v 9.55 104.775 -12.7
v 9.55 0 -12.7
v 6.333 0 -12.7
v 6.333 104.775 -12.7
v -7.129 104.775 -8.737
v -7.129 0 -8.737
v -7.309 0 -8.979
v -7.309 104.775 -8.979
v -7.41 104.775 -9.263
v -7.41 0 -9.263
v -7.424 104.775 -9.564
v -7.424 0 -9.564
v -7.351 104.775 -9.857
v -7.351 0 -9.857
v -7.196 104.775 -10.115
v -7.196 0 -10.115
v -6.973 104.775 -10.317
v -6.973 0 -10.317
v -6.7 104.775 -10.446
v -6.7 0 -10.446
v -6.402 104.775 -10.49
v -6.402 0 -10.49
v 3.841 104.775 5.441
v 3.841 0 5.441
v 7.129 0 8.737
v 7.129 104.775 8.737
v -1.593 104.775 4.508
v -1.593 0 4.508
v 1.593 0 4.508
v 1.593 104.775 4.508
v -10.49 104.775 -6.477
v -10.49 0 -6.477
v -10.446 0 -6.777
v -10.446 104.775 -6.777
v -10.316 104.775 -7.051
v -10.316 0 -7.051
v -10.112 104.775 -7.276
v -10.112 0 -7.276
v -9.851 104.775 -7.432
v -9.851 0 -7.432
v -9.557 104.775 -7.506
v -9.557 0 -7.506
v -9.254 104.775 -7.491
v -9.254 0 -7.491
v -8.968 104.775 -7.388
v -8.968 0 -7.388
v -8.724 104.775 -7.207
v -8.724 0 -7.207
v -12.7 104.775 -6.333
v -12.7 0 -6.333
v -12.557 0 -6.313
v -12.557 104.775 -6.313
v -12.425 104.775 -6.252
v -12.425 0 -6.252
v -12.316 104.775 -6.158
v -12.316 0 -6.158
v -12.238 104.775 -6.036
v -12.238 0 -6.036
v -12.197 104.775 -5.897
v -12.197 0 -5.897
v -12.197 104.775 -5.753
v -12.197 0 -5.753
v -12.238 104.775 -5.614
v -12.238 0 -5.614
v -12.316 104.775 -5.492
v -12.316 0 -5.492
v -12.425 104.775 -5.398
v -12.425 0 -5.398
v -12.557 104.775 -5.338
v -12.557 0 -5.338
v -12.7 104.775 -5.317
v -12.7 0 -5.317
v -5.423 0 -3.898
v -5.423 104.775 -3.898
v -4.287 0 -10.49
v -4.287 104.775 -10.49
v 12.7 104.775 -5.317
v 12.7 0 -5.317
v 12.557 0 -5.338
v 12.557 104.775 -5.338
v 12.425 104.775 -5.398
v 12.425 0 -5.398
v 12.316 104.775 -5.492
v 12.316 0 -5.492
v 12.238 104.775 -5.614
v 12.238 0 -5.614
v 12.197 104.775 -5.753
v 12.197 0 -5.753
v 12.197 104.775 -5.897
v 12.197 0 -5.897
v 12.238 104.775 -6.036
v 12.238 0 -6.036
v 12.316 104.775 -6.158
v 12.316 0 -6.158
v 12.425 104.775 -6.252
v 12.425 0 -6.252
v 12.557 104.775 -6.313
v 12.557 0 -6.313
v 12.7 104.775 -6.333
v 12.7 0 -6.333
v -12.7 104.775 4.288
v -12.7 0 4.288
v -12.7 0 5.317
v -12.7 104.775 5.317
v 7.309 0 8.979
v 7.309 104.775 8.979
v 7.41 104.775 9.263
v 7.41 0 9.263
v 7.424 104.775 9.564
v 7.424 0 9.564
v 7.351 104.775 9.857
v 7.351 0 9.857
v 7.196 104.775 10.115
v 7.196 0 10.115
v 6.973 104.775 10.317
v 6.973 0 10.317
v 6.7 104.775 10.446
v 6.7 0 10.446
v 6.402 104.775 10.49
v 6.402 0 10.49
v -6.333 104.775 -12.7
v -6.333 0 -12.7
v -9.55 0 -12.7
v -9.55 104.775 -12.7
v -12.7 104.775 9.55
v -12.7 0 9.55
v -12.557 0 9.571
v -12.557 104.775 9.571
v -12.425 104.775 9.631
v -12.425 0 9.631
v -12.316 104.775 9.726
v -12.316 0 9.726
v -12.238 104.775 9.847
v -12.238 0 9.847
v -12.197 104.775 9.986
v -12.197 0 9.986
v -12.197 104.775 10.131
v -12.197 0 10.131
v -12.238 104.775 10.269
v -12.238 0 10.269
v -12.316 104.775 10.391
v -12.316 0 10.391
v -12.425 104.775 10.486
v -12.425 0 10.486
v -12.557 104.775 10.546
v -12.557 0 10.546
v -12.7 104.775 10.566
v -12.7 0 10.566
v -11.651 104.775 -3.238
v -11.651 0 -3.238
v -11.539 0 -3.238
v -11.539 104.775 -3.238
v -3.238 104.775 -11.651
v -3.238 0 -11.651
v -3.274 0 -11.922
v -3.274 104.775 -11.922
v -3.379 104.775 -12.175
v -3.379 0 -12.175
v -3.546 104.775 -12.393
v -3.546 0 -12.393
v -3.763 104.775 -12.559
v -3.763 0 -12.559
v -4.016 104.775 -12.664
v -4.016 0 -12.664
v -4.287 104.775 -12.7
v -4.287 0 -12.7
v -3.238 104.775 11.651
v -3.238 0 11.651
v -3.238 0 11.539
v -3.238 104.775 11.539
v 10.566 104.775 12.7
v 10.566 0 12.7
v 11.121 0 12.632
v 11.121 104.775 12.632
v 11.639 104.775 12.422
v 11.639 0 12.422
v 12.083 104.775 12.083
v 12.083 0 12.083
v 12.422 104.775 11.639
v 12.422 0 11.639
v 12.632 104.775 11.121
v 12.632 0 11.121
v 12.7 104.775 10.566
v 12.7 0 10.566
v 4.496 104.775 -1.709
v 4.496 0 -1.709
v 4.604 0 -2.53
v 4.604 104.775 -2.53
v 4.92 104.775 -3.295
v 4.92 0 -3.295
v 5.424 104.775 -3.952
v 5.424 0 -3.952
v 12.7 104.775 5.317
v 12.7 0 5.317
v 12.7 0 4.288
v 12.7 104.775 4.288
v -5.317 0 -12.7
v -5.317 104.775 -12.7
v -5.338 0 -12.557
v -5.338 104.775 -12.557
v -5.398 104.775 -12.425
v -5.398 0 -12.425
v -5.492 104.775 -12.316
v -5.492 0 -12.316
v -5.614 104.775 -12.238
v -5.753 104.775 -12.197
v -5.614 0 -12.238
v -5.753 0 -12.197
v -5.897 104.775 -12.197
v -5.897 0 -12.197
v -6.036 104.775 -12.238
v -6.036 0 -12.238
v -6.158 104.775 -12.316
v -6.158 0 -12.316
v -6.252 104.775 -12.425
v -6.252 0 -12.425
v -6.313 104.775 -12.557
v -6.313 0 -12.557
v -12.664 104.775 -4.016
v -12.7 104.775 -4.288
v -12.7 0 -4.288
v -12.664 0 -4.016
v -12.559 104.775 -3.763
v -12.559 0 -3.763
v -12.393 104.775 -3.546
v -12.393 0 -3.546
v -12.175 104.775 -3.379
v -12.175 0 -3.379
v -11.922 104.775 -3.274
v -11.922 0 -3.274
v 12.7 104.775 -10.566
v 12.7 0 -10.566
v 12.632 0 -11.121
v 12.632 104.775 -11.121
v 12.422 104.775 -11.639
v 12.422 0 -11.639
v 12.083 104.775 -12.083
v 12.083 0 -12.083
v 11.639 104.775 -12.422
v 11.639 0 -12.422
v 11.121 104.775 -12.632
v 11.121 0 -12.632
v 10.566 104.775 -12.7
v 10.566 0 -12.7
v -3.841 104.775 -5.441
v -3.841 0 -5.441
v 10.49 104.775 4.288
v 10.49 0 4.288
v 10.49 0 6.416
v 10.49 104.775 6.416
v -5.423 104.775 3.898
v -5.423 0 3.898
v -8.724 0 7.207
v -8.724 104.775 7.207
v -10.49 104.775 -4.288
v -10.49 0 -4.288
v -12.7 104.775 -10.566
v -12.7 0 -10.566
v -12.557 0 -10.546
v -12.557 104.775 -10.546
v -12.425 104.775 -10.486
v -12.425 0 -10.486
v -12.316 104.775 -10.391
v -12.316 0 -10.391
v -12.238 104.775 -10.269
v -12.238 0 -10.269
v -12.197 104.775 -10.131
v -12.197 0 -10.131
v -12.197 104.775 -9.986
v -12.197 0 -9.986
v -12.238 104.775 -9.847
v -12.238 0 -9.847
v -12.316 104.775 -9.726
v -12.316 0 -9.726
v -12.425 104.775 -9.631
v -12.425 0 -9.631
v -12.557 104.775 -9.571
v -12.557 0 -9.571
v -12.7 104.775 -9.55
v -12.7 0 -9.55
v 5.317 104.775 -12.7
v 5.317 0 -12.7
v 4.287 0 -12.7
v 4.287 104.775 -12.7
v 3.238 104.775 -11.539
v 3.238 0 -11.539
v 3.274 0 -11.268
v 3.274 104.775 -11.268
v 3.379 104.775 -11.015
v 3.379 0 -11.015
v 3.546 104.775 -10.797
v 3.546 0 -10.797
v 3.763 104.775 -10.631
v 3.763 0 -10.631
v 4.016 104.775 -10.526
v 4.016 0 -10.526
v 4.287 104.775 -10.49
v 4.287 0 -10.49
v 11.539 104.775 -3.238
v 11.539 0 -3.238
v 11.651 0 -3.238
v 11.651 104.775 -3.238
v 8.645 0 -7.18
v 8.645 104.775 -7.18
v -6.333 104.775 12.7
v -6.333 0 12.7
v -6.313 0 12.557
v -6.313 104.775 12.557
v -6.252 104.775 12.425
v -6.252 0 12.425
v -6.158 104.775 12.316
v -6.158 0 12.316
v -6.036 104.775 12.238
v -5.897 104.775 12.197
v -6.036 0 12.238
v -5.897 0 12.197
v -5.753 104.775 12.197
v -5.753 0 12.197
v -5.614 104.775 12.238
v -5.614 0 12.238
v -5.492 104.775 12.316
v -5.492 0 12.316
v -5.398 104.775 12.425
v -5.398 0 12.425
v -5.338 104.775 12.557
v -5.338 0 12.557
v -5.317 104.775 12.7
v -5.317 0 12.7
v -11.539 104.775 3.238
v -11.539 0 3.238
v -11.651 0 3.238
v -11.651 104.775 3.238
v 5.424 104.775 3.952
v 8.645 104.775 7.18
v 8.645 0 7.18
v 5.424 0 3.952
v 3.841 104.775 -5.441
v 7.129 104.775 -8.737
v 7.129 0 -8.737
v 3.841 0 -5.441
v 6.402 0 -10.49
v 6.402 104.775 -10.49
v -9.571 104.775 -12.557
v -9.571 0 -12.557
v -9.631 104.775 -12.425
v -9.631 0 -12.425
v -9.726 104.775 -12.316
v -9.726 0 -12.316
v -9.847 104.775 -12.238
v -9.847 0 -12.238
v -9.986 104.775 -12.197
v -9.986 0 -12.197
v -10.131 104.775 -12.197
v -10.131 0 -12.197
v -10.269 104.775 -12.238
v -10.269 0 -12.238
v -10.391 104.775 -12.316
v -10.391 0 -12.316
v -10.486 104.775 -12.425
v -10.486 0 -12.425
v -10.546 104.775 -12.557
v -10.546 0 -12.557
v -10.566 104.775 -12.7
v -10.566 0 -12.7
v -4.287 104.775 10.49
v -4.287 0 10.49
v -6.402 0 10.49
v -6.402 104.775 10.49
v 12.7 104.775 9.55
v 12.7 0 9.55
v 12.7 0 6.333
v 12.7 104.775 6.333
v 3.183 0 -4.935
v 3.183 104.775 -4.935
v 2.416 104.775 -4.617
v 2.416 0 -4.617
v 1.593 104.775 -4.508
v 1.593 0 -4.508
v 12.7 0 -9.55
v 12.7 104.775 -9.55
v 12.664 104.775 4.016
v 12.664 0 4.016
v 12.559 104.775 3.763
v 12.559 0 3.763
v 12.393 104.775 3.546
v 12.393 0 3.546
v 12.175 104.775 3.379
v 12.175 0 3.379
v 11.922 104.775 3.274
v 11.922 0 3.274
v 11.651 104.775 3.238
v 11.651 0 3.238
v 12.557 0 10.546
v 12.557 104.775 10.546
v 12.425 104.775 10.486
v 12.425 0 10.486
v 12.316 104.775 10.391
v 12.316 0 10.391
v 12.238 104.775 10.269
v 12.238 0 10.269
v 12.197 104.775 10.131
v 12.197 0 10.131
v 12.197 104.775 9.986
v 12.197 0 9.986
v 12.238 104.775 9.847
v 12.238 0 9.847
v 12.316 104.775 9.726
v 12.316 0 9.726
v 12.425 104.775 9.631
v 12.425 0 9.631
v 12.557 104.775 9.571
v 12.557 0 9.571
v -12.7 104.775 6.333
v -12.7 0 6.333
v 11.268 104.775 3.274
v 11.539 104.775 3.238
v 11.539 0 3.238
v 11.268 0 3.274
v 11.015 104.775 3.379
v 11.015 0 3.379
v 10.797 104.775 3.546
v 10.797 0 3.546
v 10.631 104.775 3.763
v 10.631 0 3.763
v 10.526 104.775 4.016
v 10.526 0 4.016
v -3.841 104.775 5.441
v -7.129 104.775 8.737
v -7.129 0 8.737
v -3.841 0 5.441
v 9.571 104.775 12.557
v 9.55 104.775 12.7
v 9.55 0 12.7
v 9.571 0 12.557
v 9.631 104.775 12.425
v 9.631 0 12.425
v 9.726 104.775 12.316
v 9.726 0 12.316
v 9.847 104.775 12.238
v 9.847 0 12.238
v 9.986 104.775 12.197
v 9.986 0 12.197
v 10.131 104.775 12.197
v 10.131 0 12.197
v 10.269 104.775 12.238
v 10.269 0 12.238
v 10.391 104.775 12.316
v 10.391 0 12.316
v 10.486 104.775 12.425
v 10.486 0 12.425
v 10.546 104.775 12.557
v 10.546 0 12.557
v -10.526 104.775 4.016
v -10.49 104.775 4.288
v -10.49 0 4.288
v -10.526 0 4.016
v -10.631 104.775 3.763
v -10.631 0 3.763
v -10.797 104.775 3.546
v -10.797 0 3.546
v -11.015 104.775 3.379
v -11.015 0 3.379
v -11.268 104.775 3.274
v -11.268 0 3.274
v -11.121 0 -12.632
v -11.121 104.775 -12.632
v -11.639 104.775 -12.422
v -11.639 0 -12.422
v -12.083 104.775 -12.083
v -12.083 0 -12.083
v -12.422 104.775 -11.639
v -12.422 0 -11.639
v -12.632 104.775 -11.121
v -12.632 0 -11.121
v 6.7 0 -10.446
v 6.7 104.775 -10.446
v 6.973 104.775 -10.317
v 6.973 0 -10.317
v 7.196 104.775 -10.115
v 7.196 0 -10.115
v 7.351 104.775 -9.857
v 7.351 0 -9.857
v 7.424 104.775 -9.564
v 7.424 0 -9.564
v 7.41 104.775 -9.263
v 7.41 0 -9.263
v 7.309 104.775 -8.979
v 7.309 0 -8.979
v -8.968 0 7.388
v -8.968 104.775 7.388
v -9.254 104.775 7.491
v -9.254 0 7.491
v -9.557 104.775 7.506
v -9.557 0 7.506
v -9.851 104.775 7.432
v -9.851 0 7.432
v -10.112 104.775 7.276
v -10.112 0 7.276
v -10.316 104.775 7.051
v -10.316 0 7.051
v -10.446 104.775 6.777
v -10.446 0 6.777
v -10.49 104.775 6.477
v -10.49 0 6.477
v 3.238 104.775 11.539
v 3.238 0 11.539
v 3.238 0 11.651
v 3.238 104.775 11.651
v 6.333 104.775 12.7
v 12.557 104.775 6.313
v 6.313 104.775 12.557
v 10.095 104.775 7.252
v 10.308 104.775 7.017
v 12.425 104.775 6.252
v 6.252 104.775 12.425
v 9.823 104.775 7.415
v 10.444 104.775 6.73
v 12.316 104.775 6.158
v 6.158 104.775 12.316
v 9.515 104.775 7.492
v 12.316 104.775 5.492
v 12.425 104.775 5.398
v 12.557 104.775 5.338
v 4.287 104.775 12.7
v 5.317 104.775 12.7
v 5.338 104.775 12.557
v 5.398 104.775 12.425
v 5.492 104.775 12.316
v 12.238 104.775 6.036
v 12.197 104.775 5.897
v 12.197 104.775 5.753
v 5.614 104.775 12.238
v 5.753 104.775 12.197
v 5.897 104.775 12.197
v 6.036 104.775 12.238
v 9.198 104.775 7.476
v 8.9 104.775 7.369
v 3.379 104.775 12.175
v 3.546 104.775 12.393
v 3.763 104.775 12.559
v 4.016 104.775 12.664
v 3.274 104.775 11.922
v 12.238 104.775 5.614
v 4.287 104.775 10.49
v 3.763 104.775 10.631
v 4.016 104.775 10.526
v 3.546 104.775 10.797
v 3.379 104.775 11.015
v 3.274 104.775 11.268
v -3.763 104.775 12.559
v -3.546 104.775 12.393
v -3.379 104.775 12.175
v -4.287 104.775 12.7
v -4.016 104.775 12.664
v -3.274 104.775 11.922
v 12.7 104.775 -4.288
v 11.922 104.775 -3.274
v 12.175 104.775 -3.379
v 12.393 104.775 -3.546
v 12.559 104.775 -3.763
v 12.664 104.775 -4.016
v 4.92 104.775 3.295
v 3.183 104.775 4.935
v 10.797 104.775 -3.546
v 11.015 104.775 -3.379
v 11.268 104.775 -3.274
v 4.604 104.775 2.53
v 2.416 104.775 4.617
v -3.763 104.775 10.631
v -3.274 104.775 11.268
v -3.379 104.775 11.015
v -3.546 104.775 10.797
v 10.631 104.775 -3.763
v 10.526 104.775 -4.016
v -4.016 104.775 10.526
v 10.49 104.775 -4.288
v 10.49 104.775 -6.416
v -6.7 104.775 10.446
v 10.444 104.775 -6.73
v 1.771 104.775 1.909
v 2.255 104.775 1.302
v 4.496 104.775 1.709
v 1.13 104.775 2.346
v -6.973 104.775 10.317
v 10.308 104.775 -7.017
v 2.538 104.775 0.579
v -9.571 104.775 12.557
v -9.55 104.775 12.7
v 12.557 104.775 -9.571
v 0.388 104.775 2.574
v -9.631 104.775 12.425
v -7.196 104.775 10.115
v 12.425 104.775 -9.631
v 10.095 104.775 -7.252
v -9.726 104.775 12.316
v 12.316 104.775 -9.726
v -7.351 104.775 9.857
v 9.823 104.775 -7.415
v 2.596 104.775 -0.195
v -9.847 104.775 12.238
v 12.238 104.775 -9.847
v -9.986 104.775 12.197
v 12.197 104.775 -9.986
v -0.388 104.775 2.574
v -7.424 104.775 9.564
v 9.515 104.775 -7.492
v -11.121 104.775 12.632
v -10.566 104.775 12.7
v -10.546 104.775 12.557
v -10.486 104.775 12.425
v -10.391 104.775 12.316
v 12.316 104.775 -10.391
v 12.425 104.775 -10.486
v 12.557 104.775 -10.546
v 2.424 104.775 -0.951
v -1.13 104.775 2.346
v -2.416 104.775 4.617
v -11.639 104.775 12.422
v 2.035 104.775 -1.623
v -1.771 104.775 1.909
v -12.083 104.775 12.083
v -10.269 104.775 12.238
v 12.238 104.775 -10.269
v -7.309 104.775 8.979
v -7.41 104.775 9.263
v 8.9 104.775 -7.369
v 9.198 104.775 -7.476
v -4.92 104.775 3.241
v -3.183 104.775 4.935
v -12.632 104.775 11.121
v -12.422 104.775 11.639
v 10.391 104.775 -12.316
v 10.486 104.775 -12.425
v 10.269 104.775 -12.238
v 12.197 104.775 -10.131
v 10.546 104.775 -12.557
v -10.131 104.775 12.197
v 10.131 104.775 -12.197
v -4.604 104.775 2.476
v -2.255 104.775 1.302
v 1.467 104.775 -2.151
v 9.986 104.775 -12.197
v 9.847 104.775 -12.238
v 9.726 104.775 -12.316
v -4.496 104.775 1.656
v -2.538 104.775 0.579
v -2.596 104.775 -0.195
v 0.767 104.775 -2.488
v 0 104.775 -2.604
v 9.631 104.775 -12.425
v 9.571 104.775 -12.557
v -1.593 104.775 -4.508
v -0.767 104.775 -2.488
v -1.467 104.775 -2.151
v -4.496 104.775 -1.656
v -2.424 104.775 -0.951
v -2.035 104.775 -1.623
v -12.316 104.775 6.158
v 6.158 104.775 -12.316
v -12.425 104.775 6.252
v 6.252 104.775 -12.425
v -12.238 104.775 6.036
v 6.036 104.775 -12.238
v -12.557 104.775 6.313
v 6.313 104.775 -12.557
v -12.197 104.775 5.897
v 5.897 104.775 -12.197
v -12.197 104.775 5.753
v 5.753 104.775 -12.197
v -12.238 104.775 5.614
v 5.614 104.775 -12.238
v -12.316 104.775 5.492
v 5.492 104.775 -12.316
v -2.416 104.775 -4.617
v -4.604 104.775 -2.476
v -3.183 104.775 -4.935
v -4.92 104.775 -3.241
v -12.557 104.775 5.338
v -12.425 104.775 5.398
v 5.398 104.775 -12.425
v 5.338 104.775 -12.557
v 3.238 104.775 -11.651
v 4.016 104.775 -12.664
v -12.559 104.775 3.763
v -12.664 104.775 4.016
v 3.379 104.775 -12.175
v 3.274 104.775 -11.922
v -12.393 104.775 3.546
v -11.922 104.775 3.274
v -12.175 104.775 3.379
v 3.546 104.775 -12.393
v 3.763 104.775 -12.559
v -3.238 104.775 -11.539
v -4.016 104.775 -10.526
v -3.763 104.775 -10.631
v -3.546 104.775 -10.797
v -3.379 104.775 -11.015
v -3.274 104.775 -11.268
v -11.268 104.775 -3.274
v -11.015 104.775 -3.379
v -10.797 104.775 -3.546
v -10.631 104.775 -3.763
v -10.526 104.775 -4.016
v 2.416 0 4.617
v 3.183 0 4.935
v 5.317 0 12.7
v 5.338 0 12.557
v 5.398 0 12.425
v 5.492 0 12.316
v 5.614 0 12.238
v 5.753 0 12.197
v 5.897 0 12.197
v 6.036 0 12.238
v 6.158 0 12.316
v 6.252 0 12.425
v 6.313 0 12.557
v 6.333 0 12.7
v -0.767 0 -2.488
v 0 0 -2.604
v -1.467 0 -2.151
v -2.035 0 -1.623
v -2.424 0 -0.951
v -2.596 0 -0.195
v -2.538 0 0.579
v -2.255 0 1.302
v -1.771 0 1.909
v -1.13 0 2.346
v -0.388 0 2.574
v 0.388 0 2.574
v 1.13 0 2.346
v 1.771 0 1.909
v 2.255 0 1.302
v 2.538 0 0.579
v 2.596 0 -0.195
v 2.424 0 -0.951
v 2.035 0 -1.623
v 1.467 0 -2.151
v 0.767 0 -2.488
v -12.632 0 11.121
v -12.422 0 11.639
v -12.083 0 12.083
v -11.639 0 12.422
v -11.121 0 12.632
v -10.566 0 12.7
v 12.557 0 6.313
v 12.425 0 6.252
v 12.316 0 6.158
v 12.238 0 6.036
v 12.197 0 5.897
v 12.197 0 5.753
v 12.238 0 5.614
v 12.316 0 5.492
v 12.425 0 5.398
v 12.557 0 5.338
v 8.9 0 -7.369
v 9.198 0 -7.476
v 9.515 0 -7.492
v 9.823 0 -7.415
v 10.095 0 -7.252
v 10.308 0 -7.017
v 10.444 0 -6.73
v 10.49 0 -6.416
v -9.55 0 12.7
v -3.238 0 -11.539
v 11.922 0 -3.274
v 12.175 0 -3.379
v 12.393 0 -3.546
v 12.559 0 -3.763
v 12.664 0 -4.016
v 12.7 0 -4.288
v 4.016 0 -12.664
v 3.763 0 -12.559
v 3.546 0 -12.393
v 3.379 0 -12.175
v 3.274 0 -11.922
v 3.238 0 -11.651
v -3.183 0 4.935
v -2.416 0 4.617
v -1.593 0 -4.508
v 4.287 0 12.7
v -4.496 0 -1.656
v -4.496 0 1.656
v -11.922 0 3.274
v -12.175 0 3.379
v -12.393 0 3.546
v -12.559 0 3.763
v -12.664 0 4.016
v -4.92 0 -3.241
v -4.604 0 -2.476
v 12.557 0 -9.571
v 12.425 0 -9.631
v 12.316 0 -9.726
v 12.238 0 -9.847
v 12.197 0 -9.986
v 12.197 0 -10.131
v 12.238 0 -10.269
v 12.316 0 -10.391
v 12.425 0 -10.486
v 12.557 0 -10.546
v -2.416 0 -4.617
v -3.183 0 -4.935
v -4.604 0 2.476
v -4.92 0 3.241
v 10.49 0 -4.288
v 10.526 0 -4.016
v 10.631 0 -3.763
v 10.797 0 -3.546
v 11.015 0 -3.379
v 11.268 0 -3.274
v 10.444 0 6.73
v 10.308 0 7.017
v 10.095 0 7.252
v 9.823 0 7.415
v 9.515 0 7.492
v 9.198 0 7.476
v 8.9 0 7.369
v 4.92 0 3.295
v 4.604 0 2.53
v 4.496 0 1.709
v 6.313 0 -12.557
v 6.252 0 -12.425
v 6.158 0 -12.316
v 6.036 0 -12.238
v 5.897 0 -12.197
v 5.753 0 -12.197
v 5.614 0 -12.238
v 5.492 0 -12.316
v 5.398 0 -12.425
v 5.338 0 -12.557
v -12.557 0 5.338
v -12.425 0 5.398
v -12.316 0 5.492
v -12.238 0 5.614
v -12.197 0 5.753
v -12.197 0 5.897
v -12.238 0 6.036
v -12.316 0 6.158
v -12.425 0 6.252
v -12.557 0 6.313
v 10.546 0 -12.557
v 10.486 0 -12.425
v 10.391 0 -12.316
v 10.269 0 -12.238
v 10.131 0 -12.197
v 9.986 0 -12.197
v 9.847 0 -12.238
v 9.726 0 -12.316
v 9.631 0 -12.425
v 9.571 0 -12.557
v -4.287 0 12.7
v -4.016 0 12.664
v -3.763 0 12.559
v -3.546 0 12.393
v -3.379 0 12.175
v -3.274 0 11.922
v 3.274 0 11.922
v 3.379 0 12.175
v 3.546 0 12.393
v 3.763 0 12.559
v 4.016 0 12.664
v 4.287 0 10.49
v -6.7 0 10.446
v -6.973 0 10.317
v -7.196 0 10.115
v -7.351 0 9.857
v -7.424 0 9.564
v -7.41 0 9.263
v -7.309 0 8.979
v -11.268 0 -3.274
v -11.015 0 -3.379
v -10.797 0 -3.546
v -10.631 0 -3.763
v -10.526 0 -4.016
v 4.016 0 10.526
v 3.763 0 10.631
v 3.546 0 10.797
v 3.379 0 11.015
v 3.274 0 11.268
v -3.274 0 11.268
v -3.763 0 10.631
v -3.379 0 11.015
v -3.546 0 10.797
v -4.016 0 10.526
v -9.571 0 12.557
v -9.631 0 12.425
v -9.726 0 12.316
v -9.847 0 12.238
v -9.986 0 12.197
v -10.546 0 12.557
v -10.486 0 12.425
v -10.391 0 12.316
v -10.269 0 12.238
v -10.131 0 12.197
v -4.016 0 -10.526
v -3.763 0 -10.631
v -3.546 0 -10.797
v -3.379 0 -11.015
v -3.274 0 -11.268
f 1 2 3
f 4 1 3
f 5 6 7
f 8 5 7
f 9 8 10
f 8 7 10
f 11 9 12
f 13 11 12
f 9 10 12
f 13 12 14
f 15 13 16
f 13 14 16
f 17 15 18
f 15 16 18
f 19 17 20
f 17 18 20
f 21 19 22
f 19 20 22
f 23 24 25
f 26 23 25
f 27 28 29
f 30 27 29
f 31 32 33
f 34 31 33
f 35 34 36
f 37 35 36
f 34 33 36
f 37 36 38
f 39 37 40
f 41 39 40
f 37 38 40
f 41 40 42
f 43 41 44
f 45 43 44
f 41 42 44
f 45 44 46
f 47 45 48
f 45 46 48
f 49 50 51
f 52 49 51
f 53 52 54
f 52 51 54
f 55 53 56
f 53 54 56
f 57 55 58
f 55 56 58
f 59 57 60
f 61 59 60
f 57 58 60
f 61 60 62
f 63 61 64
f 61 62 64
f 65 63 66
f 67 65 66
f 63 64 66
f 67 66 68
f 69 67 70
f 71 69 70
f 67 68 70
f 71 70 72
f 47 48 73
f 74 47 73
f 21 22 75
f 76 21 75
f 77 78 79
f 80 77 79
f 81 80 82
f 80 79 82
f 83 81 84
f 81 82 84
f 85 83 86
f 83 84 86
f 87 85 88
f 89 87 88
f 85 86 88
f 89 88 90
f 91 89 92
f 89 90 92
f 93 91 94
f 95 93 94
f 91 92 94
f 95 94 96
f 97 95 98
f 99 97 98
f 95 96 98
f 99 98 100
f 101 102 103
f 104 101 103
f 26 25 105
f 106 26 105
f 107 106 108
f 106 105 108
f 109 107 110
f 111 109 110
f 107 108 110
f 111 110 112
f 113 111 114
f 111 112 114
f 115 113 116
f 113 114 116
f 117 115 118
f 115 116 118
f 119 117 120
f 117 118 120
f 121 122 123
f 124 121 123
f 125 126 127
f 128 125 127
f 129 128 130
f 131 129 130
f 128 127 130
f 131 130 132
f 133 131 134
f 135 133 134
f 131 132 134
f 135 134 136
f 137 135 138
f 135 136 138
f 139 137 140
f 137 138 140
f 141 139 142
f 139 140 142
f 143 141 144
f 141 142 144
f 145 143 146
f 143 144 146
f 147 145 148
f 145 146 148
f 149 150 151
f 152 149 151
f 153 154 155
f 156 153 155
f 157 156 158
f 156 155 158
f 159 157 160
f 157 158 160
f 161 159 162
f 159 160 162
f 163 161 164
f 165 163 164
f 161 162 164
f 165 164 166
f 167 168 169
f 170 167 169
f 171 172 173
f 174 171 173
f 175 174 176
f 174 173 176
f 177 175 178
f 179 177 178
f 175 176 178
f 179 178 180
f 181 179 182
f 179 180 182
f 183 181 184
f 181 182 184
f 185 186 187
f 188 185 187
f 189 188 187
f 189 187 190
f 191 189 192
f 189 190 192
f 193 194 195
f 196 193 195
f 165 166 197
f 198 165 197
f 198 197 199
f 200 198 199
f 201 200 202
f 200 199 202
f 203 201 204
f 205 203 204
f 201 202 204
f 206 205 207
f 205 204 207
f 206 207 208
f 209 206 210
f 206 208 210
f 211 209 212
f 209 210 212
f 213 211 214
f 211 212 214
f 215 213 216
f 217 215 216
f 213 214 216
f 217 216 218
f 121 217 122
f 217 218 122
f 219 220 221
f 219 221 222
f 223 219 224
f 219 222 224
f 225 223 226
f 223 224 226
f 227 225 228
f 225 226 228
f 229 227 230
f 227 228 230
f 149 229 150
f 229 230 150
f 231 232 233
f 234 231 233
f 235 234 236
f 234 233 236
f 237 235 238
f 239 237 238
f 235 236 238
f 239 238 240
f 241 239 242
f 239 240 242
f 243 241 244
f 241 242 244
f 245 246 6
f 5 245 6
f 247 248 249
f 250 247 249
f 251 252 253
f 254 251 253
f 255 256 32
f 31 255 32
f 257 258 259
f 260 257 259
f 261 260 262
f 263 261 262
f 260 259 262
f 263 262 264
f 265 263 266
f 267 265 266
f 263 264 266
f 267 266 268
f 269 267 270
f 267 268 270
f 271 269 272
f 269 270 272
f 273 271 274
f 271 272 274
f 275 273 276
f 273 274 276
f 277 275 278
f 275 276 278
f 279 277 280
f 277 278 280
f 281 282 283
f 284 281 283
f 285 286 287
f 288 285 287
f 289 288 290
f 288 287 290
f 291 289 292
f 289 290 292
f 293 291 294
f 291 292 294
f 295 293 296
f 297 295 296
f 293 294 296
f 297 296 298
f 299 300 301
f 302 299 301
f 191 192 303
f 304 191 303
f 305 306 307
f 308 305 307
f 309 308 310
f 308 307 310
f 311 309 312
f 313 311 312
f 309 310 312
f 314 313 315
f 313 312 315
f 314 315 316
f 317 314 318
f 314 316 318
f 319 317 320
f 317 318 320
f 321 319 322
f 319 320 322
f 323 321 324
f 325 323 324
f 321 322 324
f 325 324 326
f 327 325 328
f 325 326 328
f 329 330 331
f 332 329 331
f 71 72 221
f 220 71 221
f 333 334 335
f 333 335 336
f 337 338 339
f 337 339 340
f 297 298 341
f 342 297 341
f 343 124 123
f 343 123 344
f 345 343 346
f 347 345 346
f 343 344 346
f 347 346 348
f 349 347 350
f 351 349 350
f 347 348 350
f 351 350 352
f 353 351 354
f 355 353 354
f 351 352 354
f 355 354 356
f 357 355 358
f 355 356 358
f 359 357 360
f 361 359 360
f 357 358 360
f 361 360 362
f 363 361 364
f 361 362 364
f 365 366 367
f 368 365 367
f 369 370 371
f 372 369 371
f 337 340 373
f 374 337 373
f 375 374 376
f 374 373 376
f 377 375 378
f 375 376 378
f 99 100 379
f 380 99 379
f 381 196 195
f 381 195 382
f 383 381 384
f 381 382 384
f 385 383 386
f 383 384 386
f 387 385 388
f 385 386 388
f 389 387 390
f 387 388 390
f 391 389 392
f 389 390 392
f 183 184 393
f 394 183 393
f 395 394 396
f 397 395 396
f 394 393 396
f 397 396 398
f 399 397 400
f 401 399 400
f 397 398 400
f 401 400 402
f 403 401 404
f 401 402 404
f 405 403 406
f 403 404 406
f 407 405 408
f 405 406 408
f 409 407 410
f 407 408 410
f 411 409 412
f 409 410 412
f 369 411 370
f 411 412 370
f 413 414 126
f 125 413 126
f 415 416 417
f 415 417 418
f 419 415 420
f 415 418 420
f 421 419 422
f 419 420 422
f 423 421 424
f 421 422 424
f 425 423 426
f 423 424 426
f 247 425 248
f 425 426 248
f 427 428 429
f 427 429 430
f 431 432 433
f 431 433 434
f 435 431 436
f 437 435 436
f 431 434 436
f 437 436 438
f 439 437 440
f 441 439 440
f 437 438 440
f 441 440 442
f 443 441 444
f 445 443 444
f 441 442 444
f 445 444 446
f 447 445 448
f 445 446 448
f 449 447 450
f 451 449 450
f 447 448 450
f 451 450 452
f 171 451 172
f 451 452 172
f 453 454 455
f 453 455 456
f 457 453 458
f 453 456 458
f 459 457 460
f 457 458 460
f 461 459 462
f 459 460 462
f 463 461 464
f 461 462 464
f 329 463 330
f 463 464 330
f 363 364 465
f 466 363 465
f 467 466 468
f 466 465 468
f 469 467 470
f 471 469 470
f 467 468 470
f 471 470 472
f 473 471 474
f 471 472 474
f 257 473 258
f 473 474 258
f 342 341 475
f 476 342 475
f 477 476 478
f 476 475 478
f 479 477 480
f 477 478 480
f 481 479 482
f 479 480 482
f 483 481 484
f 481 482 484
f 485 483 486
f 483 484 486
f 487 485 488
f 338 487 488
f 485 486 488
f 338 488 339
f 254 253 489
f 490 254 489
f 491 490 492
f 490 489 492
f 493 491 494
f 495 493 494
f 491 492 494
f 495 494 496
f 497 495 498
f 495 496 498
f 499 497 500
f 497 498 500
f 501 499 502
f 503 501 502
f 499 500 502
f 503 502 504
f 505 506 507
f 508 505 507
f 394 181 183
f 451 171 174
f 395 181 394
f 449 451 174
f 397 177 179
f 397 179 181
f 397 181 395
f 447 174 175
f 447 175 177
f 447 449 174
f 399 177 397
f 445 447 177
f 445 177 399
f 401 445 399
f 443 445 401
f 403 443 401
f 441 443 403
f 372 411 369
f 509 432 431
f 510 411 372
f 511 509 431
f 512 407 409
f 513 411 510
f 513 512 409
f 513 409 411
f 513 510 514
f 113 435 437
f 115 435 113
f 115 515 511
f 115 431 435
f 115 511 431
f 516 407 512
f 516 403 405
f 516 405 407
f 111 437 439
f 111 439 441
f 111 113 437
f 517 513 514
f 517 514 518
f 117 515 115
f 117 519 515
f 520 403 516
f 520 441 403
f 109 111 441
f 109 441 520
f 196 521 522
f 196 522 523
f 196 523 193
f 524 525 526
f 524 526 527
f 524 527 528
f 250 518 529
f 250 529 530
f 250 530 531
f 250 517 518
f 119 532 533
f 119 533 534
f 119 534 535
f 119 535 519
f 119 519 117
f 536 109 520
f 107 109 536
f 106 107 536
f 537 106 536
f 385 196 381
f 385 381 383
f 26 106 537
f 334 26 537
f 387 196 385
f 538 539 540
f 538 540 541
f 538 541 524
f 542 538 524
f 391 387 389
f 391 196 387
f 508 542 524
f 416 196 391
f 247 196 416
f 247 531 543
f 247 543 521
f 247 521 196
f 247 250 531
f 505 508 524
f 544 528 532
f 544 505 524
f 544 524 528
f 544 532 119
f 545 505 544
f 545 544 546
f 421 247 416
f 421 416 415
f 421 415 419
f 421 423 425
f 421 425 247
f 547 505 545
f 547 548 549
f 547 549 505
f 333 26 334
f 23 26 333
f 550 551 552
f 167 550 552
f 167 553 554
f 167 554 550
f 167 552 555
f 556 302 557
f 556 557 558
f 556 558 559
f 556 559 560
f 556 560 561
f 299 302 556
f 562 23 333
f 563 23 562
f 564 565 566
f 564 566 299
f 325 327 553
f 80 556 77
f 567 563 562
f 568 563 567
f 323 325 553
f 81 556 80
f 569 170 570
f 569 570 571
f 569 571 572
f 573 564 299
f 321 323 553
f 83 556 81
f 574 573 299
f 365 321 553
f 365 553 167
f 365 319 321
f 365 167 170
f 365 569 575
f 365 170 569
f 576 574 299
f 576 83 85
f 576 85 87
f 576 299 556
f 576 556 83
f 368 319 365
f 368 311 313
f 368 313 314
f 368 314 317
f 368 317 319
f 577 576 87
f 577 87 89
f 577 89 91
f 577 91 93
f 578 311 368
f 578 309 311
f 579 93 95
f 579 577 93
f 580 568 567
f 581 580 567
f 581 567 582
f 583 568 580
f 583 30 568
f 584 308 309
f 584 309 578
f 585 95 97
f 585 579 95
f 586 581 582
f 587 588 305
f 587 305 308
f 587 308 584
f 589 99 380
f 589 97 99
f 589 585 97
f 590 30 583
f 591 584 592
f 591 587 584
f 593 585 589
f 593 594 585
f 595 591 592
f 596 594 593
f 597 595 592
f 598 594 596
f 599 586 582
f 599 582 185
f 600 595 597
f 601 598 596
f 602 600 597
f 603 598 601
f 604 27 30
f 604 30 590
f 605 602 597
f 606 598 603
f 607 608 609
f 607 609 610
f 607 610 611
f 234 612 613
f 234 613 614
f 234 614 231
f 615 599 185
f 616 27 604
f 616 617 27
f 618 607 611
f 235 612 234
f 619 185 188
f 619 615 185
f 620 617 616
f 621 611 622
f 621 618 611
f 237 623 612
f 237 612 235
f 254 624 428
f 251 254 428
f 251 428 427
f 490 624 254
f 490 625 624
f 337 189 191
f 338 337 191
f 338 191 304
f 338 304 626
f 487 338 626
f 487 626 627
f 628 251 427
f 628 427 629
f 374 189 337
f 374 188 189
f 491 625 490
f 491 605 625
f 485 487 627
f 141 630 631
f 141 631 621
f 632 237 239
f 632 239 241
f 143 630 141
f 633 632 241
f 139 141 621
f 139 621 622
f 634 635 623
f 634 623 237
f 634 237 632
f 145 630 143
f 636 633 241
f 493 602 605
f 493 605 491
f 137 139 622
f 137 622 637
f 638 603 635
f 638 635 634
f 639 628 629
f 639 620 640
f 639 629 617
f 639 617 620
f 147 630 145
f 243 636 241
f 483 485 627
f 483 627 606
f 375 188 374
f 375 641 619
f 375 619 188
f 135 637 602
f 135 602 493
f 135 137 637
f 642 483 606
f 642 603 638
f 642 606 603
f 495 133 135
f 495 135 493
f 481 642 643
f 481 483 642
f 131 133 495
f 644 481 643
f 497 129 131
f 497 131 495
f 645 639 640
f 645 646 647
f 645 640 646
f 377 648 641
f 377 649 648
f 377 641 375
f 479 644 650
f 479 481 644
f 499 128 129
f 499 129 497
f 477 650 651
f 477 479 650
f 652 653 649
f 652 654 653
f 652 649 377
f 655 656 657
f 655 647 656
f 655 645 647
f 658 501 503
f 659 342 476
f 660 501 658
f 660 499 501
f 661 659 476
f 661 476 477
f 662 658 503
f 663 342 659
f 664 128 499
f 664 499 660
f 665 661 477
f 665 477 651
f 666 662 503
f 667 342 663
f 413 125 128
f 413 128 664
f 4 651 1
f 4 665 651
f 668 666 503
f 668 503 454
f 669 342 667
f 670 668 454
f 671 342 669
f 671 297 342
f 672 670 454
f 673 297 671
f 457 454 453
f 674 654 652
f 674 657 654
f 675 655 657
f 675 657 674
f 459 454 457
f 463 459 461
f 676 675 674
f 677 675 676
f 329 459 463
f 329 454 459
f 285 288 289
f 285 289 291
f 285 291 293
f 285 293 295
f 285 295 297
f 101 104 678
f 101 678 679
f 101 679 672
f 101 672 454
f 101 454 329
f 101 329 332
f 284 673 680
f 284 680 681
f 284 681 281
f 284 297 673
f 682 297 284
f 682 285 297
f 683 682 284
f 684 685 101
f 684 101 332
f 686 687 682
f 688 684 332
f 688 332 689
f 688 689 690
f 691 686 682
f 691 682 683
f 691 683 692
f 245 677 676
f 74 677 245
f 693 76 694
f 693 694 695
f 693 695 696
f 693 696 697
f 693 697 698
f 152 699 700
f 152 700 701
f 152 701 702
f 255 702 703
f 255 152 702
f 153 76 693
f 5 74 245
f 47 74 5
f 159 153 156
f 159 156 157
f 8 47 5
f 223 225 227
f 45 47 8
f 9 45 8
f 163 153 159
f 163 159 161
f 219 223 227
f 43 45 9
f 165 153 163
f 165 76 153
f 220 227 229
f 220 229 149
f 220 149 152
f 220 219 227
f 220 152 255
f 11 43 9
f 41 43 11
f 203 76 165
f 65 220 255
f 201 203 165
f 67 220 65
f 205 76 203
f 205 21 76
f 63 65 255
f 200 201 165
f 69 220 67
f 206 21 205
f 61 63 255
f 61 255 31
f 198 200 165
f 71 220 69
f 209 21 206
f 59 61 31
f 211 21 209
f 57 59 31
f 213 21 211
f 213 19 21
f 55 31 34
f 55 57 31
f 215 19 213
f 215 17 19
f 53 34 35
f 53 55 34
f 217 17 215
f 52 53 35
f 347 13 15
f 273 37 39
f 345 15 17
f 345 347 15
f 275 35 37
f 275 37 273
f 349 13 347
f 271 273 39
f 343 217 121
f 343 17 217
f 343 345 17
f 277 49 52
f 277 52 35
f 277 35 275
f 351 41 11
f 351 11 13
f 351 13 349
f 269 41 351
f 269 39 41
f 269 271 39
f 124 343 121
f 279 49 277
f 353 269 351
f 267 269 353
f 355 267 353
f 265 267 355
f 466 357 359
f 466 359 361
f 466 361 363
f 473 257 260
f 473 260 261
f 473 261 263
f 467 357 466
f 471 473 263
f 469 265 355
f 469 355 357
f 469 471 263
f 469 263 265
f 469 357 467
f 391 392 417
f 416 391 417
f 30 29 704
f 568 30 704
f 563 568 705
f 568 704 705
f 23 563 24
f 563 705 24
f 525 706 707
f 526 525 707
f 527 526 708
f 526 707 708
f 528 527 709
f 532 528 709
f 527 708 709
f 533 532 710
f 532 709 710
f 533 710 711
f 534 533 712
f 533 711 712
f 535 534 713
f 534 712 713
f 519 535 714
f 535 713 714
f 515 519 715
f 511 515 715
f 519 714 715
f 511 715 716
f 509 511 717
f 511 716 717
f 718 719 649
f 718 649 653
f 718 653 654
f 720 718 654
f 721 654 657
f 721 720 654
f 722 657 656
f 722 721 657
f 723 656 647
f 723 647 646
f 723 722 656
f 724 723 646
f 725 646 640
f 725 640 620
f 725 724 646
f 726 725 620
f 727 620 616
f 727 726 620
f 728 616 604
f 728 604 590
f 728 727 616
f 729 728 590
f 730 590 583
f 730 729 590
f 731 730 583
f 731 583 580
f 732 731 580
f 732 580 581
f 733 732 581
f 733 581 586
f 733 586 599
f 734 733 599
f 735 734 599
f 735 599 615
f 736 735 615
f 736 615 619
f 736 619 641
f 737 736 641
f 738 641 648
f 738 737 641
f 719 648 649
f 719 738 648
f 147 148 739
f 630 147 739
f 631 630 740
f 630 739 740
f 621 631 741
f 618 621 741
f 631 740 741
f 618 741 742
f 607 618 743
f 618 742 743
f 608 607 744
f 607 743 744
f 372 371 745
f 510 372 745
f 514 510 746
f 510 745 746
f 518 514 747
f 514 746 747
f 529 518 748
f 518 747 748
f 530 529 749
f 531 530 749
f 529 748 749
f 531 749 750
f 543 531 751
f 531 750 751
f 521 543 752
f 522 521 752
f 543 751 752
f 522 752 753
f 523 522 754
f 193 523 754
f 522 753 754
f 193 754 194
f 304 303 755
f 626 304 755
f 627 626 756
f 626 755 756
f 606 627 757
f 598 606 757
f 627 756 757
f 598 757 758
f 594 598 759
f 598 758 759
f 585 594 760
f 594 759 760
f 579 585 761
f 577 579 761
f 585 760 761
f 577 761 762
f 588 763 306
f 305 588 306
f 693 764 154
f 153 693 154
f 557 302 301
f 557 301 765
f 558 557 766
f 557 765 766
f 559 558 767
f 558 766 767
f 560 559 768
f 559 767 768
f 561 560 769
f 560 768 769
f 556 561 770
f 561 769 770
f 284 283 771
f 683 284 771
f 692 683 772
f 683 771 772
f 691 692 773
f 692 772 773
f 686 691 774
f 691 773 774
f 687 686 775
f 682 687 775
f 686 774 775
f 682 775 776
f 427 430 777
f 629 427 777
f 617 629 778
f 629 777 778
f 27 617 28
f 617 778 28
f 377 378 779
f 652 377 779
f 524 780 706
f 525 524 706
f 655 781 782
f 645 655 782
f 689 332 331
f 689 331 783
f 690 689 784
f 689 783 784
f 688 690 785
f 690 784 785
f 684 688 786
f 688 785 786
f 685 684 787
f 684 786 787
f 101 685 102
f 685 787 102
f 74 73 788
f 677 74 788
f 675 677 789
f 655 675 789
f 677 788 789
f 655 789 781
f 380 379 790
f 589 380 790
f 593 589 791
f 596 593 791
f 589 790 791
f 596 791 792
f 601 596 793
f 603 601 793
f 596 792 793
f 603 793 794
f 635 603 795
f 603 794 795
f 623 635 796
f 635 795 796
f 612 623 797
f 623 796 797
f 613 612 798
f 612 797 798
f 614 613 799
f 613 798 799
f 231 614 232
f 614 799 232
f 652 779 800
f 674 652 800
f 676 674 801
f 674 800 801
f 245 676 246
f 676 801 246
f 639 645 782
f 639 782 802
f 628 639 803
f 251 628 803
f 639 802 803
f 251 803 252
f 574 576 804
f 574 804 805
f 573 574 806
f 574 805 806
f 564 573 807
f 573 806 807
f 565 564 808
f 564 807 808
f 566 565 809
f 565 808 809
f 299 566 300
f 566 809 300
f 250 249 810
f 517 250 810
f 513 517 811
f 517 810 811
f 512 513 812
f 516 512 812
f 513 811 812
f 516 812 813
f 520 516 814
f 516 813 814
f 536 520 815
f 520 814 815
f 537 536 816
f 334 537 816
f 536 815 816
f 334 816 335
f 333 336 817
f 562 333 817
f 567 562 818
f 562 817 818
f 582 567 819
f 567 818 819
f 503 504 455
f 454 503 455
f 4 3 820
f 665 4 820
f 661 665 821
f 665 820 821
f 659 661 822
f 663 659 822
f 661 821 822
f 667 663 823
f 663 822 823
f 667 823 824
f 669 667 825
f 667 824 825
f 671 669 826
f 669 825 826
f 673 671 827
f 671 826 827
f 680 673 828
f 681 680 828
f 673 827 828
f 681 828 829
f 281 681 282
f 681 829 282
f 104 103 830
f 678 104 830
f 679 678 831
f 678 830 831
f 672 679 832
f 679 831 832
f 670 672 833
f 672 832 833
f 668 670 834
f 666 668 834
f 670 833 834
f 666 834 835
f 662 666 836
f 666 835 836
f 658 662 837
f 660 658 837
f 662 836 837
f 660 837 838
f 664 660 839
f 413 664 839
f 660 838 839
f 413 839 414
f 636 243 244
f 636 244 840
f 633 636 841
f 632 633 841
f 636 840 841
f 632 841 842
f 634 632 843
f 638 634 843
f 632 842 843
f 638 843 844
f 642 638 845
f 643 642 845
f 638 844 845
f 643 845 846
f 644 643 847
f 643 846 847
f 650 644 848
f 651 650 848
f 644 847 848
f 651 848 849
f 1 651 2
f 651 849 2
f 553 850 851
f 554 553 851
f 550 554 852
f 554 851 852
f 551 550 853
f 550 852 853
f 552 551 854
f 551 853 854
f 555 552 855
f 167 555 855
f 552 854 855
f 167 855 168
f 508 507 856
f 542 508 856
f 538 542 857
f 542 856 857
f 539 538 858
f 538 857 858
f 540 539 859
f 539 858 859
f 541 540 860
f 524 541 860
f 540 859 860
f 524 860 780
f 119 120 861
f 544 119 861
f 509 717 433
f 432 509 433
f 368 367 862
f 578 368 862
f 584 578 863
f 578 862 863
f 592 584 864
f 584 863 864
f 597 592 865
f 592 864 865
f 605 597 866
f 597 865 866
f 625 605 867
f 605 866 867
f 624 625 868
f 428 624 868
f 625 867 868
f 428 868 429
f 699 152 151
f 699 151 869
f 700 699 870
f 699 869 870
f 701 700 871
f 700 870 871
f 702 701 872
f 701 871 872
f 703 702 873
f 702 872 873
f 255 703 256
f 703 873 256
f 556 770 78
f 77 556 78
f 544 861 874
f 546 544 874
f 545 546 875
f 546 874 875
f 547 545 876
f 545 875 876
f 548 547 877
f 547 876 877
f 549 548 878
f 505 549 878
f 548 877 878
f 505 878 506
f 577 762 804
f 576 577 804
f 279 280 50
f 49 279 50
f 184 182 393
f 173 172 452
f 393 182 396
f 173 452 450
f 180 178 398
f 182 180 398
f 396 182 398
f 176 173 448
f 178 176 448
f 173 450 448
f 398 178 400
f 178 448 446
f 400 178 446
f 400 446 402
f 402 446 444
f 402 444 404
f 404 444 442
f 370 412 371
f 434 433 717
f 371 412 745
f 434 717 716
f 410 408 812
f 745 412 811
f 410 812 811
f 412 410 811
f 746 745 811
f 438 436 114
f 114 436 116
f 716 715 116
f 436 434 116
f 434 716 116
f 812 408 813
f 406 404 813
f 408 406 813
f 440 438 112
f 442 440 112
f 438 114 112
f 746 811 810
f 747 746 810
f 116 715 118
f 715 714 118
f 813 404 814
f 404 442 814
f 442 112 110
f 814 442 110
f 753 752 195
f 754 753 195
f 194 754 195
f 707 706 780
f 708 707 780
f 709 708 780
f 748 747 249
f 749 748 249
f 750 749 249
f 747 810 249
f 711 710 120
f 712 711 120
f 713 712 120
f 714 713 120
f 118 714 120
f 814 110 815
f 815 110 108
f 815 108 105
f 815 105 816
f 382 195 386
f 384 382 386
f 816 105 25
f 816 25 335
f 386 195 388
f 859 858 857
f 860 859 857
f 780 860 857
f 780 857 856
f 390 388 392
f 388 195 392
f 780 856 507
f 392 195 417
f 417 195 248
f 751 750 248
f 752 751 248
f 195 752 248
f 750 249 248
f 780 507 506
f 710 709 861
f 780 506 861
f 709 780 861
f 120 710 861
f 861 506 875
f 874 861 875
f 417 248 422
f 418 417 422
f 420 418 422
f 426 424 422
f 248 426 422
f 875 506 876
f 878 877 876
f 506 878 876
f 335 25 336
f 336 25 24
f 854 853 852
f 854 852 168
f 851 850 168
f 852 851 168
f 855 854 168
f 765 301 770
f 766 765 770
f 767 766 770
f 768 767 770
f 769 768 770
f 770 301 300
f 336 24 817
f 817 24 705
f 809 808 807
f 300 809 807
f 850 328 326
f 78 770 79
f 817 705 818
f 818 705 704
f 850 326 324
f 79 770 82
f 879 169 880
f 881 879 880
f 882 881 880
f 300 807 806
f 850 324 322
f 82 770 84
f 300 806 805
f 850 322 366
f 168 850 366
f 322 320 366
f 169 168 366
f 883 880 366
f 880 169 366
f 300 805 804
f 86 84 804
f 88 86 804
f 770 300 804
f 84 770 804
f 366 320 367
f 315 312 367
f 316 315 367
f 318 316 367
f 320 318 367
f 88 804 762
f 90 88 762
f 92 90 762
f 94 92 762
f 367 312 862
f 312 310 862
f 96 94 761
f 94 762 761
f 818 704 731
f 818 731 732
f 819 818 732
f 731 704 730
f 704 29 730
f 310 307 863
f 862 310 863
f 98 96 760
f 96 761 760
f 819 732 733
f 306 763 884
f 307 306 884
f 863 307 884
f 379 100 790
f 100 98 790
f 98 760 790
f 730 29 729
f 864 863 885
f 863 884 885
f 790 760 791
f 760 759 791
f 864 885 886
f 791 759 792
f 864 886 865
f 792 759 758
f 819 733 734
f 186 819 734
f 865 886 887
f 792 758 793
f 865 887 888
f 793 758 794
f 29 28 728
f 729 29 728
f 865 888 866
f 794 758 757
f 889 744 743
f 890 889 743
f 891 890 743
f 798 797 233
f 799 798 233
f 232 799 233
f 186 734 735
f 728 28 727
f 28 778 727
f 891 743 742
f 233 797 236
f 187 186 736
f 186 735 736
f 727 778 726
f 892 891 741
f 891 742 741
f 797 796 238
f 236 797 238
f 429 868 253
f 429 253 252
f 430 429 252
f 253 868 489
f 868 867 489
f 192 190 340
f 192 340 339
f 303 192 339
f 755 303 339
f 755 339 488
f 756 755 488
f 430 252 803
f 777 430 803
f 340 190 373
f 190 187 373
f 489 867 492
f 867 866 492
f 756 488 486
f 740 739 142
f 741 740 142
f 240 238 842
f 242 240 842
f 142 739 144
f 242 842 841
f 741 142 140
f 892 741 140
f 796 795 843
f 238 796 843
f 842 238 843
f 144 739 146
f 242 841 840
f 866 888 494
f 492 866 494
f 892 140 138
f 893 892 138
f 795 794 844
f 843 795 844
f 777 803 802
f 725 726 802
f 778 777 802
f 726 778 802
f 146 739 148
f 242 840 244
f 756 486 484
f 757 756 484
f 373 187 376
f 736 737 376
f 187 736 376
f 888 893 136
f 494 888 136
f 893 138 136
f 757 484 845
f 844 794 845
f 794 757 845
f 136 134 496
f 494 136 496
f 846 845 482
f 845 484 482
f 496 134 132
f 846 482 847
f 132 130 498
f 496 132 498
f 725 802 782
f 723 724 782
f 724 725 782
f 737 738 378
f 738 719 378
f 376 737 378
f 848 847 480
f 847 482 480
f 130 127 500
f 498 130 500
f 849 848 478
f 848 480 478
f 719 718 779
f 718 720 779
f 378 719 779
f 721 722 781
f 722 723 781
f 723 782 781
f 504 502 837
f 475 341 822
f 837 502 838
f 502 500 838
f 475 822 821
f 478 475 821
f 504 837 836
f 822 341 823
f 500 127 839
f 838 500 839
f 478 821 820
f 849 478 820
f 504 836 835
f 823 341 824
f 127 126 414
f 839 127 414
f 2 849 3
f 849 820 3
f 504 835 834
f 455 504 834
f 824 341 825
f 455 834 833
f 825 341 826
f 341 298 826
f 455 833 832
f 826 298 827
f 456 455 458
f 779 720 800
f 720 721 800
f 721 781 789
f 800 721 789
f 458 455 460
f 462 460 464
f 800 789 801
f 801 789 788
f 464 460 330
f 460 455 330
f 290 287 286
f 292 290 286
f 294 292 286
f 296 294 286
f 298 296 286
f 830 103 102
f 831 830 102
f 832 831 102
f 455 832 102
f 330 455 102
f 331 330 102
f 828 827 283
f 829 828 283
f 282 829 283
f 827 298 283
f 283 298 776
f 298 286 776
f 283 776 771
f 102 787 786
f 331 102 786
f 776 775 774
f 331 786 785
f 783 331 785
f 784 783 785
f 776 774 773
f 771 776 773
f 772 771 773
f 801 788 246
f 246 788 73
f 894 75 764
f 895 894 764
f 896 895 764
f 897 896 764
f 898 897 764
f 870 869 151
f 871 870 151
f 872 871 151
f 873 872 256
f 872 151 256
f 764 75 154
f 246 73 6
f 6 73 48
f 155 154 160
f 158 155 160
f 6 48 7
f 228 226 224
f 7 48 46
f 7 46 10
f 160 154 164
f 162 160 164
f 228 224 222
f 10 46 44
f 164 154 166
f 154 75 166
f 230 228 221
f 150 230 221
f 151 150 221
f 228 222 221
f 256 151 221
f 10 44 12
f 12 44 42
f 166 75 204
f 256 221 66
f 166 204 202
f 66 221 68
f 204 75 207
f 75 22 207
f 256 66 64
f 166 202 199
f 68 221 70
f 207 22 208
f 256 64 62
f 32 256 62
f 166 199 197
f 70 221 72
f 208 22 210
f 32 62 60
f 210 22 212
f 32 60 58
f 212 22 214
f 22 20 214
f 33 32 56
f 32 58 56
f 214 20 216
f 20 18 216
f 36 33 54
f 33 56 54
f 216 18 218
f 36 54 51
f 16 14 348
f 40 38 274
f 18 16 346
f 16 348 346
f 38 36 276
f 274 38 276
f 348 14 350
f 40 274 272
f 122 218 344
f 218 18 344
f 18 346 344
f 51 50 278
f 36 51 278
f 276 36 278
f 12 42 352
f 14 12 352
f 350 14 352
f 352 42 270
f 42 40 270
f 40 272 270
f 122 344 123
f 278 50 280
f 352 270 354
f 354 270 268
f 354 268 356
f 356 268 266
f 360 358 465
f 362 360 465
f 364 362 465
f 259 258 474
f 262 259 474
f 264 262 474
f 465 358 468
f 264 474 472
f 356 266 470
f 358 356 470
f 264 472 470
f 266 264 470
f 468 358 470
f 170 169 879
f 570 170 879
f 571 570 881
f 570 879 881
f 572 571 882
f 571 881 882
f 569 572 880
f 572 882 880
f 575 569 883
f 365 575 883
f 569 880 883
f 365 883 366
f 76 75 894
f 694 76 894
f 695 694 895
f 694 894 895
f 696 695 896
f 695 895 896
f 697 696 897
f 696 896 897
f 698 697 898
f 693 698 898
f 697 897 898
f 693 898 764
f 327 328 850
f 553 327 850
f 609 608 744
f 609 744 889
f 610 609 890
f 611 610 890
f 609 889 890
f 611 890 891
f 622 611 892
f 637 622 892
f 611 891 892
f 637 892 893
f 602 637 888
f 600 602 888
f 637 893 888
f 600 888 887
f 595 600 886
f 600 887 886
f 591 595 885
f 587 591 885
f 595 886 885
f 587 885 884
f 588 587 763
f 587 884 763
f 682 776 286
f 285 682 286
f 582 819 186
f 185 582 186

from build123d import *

# Parameters (mm, degrees)
SKETCH1_R           = 2.6035
BOSS_EXTRUDE1_DEPTH = 104.775


with BuildPart() as part:
    # Sketch1 → Boss-Extrude1 (new body)
    with BuildSketch(Plane(origin=(0, 0, 0), x_dir=(0, 0, -1), z_dir=(0, 1, 0))):
        with BuildLine():
            Line((6.333126718, -12.7), (9.550443118, -12.7))
            ThreePointArc((9.550443118, -12.7), (10.058366869, -12.192000006), (10.566443095, -12.699847501))
            ThreePointArc((10.566443095, -12.699847501), (12.082537762, -12.08250727), (12.699846982, -10.566399977))
            ThreePointArc((12.699846982, -10.566399977), (12.192000006, -10.058323491), (12.7, -9.5504))
            Line((12.7, -9.5504), (12.7, -6.3330836))
            ThreePointArc((12.7, -6.3330836), (12.192, -5.8250836), (12.7, -5.3170836))
            Line((12.7, -5.3170836), (12.7, -4.287469289))
            ThreePointArc((12.7, -4.287469289), (12.39275138, -3.545705502), (11.650987593, -3.238456882))
            Line((11.650987593, -3.238456882), (11.539212407, -3.238456882))
            ThreePointArc((11.539212407, -3.238456882), (10.79744862, -3.545705502), (10.4902, -4.287469289))
            Line((10.4902, -4.287469289), (10.4902, -6.402089023))
            ThreePointArc((10.4902, -6.402089023), (9.856505071, -7.351067942), (8.737131347, -7.129408934))
            Line((8.737131347, -7.129408934), (5.441005833, -3.840816462))
            ThreePointArc((5.441005833, -3.840816462), (4.750877967, -2.809883091), (4.5085, -1.593185507))
            Line((4.5085, -1.593185507), (4.5085, 1.593185507))
            ThreePointArc((4.5085, 1.593185507), (4.750877967, 2.809883091), (5.441005833, 3.840816462))
            Line((5.441005833, 3.840816462), (8.737131347, 7.129408934))
            ThreePointArc((8.737131347, 7.129408934), (9.856505071, 7.351067942), (10.4902, 6.402089023))
            Line((10.4902, 6.402089023), (10.4902, 4.287469289))
            ThreePointArc((10.4902, 4.287469289), (10.79744862, 3.545705502), (11.539212407, 3.238456882))
            Line((11.539212407, 3.238456882), (11.650987593, 3.238456882))
            ThreePointArc((11.650987593, 3.238456882), (12.39275138, 3.545705502), (12.7, 4.287469289))
            Line((12.7, 4.287469289), (12.7, 5.3170836))
            ThreePointArc((12.7, 5.3170836), (12.192, 5.8250836), (12.7, 6.3330836))
            Line((12.7, 6.3330836), (12.7, 9.5504))
            ThreePointArc((12.7, 9.5504), (12.192000006, 10.058323491), (12.699846982, 10.566399977))
            ThreePointArc((12.699846982, 10.566399977), (12.082537762, 12.08250727), (10.566443095, 12.699847501))
            ThreePointArc((10.566443095, 12.699847501), (10.058366869, 12.192000006), (9.550443118, 12.7))
            Line((9.550443118, 12.7), (6.333126718, 12.7))
            ThreePointArc((6.333126718, 12.7), (5.825126718, 12.192), (5.317126718, 12.7))
            Line((5.317126718, 12.7), (4.287512407, 12.7))
            ThreePointArc((4.287512407, 12.7), (3.54574862, 12.39275138), (3.2385, 11.650987593))
            Line((3.2385, 11.650987593), (3.2385, 11.539212407))
            ThreePointArc((3.2385, 11.539212407), (3.54574862, 10.79744862), (4.287512407, 10.4902))
            Line((4.287512407, 10.4902), (6.476788598, 10.4902))
            ThreePointArc((6.476788598, 10.4902), (7.432222385, 9.85140422), (7.207036008, 8.724370562))
            Line((7.207036008, 8.724370562), (3.898272566, 5.423169045))
            ThreePointArc((3.898272566, 5.423169045), (2.869120213, 4.736787962), (1.655778399, 4.4958))
            Line((1.655778399, 4.4958), (-1.655778399, 4.4958))
            ThreePointArc((-1.655778399, 4.4958), (-2.869120213, 4.736787962), (-3.898272566, 5.423169045))
            Line((-3.898272566, 5.423169045), (-7.207036008, 8.724370562))
            ThreePointArc((-7.207036008, 8.724370562), (-7.432222385, 9.85140422), (-6.476788598, 10.4902))
            Line((-6.476788598, 10.4902), (-4.287512407, 10.4902))
            ThreePointArc((-4.287512407, 10.4902), (-3.54574862, 10.79744862), (-3.2385, 11.539212407))
            Line((-3.2385, 11.539212407), (-3.2385, 11.650987593))
            ThreePointArc((-3.2385, 11.650987593), (-3.54574862, 12.39275138), (-4.287512407, 12.7))
            Line((-4.287512407, 12.7), (-5.317126718, 12.7))
            ThreePointArc((-5.317126718, 12.7), (-5.825126718, 12.192), (-6.333126718, 12.7))
            Line((-6.333126718, 12.7), (-9.550443118, 12.7))
            ThreePointArc((-9.550443118, 12.7), (-10.058366869, 12.192000006), (-10.566443095, 12.699847501))
            ThreePointArc((-10.566443095, 12.699847501), (-12.082537762, 12.08250727), (-12.699846982, 10.566399977))
            ThreePointArc((-12.699846982, 10.566399977), (-12.192000006, 10.058323491), (-12.7, 9.5504))
            Line((-12.7, 9.5504), (-12.7, 6.3330836))
            ThreePointArc((-12.7, 6.3330836), (-12.192, 5.8250836), (-12.7, 5.3170836))
            Line((-12.7, 5.3170836), (-12.7, 4.287469289))
            ThreePointArc((-12.7, 4.287469289), (-12.39275138, 3.545705502), (-11.650987593, 3.238456882))
            Line((-11.650987593, 3.238456882), (-11.539212407, 3.238456882))
            ThreePointArc((-11.539212407, 3.238456882), (-10.79744862, 3.545705502), (-10.4902, 4.287469289))
            Line((-10.4902, 4.287469289), (-10.4902, 6.402089023))
            ThreePointArc((-10.4902, 6.402089023), (-9.856505071, 7.351067942), (-8.737131347, 7.129408934))
            Line((-8.737131347, 7.129408934), (-5.441005833, 3.840816462))
            ThreePointArc((-5.441005833, 3.840816462), (-4.750877967, 2.809883091), (-4.5085, 1.593185507))
            Line((-4.5085, 1.593185507), (-4.5085, -1.593185507))
            ThreePointArc((-4.5085, -1.593185507), (-4.750877967, -2.809883091), (-5.441005833, -3.840816462))
            Line((-5.441005833, -3.840816462), (-8.737131347, -7.129408934))
            ThreePointArc((-8.737131347, -7.129408934), (-9.856505071, -7.351067942), (-10.4902, -6.402089023))
            Line((-10.4902, -6.402089023), (-10.4902, -4.287469289))
            ThreePointArc((-10.4902, -4.287469289), (-10.79744862, -3.545705502), (-11.539212407, -3.238456882))
            Line((-11.539212407, -3.238456882), (-11.650987593, -3.238456882))
            ThreePointArc((-11.650987593, -3.238456882), (-12.39275138, -3.545705502), (-12.7, -4.287469289))
            Line((-12.7, -4.287469289), (-12.7, -5.3170836))
            ThreePointArc((-12.7, -5.3170836), (-12.192, -5.8250836), (-12.7, -6.3330836))
            Line((-12.7, -6.3330836), (-12.7, -9.5504))
            ThreePointArc((-12.7, -9.5504), (-12.192000006, -10.058323491), (-12.699846982, -10.566399977))
            ThreePointArc((-12.699846982, -10.566399977), (-12.082537762, -12.08250727), (-10.566443095, -12.699847501))
            ThreePointArc((-10.566443095, -12.699847501), (-10.058366869, -12.192000006), (-9.550443118, -12.7))
            Line((-9.550443118, -12.7), (-6.333126718, -12.7))
            ThreePointArc((-6.333126718, -12.7), (-5.825126718, -12.192), (-5.317126718, -12.7))
            Line((-5.317126718, -12.7), (-4.287512407, -12.7))
            ThreePointArc((-4.287512407, -12.7), (-3.54574862, -12.39275138), (-3.2385, -11.650987593))
            Line((-3.2385, -11.650987593), (-3.2385, -11.539212407))
            ThreePointArc((-3.2385, -11.539212407), (-3.54574862, -10.79744862), (-4.287512407, -10.4902))
            Line((-4.287512407, -10.4902), (-6.416408329, -10.4902))
            ThreePointArc((-6.416408329, -10.4902), (-7.41473083, -9.822813117), (-7.179650497, -8.645192506))
            Line((-7.179650497, -8.645192506), (-3.952270251, -5.423690499))
            ThreePointArc((-3.952270251, -5.423690499), (-2.922936451, -4.736929036), (-1.709253557, -4.4958))
            Line((-1.709253557, -4.4958), (1.709253557, -4.4958))
            ThreePointArc((1.709253557, -4.4958), (2.922936451, -4.736929036), (3.952270251, -5.423690499))
            Line((3.952270251, -5.423690499), (7.179650497, -8.645192506))
            ThreePointArc((7.179650497, -8.645192506), (7.41473083, -9.822813117), (6.416408329, -10.4902))
            Line((6.416408329, -10.4902), (4.287512407, -10.4902))
            ThreePointArc((4.287512407, -10.4902), (3.54574862, -10.79744862), (3.2385, -11.539212407))
            Line((3.2385, -11.539212407), (3.2385, -11.650987593))
            ThreePointArc((3.2385, -11.650987593), (3.54574862, -12.39275138), (4.287512407, -12.7))
            Line((4.287512407, -12.7), (5.317126718, -12.7))
            ThreePointArc((5.317126718, -12.7), (5.825126718, -12.192), (6.333126718, -12.7))
        make_face()
        Circle(SKETCH1_R, mode=Mode.SUBTRACT)
    extrude(amount=BOSS_EXTRUDE1_DEPTH)


solid = part.part
